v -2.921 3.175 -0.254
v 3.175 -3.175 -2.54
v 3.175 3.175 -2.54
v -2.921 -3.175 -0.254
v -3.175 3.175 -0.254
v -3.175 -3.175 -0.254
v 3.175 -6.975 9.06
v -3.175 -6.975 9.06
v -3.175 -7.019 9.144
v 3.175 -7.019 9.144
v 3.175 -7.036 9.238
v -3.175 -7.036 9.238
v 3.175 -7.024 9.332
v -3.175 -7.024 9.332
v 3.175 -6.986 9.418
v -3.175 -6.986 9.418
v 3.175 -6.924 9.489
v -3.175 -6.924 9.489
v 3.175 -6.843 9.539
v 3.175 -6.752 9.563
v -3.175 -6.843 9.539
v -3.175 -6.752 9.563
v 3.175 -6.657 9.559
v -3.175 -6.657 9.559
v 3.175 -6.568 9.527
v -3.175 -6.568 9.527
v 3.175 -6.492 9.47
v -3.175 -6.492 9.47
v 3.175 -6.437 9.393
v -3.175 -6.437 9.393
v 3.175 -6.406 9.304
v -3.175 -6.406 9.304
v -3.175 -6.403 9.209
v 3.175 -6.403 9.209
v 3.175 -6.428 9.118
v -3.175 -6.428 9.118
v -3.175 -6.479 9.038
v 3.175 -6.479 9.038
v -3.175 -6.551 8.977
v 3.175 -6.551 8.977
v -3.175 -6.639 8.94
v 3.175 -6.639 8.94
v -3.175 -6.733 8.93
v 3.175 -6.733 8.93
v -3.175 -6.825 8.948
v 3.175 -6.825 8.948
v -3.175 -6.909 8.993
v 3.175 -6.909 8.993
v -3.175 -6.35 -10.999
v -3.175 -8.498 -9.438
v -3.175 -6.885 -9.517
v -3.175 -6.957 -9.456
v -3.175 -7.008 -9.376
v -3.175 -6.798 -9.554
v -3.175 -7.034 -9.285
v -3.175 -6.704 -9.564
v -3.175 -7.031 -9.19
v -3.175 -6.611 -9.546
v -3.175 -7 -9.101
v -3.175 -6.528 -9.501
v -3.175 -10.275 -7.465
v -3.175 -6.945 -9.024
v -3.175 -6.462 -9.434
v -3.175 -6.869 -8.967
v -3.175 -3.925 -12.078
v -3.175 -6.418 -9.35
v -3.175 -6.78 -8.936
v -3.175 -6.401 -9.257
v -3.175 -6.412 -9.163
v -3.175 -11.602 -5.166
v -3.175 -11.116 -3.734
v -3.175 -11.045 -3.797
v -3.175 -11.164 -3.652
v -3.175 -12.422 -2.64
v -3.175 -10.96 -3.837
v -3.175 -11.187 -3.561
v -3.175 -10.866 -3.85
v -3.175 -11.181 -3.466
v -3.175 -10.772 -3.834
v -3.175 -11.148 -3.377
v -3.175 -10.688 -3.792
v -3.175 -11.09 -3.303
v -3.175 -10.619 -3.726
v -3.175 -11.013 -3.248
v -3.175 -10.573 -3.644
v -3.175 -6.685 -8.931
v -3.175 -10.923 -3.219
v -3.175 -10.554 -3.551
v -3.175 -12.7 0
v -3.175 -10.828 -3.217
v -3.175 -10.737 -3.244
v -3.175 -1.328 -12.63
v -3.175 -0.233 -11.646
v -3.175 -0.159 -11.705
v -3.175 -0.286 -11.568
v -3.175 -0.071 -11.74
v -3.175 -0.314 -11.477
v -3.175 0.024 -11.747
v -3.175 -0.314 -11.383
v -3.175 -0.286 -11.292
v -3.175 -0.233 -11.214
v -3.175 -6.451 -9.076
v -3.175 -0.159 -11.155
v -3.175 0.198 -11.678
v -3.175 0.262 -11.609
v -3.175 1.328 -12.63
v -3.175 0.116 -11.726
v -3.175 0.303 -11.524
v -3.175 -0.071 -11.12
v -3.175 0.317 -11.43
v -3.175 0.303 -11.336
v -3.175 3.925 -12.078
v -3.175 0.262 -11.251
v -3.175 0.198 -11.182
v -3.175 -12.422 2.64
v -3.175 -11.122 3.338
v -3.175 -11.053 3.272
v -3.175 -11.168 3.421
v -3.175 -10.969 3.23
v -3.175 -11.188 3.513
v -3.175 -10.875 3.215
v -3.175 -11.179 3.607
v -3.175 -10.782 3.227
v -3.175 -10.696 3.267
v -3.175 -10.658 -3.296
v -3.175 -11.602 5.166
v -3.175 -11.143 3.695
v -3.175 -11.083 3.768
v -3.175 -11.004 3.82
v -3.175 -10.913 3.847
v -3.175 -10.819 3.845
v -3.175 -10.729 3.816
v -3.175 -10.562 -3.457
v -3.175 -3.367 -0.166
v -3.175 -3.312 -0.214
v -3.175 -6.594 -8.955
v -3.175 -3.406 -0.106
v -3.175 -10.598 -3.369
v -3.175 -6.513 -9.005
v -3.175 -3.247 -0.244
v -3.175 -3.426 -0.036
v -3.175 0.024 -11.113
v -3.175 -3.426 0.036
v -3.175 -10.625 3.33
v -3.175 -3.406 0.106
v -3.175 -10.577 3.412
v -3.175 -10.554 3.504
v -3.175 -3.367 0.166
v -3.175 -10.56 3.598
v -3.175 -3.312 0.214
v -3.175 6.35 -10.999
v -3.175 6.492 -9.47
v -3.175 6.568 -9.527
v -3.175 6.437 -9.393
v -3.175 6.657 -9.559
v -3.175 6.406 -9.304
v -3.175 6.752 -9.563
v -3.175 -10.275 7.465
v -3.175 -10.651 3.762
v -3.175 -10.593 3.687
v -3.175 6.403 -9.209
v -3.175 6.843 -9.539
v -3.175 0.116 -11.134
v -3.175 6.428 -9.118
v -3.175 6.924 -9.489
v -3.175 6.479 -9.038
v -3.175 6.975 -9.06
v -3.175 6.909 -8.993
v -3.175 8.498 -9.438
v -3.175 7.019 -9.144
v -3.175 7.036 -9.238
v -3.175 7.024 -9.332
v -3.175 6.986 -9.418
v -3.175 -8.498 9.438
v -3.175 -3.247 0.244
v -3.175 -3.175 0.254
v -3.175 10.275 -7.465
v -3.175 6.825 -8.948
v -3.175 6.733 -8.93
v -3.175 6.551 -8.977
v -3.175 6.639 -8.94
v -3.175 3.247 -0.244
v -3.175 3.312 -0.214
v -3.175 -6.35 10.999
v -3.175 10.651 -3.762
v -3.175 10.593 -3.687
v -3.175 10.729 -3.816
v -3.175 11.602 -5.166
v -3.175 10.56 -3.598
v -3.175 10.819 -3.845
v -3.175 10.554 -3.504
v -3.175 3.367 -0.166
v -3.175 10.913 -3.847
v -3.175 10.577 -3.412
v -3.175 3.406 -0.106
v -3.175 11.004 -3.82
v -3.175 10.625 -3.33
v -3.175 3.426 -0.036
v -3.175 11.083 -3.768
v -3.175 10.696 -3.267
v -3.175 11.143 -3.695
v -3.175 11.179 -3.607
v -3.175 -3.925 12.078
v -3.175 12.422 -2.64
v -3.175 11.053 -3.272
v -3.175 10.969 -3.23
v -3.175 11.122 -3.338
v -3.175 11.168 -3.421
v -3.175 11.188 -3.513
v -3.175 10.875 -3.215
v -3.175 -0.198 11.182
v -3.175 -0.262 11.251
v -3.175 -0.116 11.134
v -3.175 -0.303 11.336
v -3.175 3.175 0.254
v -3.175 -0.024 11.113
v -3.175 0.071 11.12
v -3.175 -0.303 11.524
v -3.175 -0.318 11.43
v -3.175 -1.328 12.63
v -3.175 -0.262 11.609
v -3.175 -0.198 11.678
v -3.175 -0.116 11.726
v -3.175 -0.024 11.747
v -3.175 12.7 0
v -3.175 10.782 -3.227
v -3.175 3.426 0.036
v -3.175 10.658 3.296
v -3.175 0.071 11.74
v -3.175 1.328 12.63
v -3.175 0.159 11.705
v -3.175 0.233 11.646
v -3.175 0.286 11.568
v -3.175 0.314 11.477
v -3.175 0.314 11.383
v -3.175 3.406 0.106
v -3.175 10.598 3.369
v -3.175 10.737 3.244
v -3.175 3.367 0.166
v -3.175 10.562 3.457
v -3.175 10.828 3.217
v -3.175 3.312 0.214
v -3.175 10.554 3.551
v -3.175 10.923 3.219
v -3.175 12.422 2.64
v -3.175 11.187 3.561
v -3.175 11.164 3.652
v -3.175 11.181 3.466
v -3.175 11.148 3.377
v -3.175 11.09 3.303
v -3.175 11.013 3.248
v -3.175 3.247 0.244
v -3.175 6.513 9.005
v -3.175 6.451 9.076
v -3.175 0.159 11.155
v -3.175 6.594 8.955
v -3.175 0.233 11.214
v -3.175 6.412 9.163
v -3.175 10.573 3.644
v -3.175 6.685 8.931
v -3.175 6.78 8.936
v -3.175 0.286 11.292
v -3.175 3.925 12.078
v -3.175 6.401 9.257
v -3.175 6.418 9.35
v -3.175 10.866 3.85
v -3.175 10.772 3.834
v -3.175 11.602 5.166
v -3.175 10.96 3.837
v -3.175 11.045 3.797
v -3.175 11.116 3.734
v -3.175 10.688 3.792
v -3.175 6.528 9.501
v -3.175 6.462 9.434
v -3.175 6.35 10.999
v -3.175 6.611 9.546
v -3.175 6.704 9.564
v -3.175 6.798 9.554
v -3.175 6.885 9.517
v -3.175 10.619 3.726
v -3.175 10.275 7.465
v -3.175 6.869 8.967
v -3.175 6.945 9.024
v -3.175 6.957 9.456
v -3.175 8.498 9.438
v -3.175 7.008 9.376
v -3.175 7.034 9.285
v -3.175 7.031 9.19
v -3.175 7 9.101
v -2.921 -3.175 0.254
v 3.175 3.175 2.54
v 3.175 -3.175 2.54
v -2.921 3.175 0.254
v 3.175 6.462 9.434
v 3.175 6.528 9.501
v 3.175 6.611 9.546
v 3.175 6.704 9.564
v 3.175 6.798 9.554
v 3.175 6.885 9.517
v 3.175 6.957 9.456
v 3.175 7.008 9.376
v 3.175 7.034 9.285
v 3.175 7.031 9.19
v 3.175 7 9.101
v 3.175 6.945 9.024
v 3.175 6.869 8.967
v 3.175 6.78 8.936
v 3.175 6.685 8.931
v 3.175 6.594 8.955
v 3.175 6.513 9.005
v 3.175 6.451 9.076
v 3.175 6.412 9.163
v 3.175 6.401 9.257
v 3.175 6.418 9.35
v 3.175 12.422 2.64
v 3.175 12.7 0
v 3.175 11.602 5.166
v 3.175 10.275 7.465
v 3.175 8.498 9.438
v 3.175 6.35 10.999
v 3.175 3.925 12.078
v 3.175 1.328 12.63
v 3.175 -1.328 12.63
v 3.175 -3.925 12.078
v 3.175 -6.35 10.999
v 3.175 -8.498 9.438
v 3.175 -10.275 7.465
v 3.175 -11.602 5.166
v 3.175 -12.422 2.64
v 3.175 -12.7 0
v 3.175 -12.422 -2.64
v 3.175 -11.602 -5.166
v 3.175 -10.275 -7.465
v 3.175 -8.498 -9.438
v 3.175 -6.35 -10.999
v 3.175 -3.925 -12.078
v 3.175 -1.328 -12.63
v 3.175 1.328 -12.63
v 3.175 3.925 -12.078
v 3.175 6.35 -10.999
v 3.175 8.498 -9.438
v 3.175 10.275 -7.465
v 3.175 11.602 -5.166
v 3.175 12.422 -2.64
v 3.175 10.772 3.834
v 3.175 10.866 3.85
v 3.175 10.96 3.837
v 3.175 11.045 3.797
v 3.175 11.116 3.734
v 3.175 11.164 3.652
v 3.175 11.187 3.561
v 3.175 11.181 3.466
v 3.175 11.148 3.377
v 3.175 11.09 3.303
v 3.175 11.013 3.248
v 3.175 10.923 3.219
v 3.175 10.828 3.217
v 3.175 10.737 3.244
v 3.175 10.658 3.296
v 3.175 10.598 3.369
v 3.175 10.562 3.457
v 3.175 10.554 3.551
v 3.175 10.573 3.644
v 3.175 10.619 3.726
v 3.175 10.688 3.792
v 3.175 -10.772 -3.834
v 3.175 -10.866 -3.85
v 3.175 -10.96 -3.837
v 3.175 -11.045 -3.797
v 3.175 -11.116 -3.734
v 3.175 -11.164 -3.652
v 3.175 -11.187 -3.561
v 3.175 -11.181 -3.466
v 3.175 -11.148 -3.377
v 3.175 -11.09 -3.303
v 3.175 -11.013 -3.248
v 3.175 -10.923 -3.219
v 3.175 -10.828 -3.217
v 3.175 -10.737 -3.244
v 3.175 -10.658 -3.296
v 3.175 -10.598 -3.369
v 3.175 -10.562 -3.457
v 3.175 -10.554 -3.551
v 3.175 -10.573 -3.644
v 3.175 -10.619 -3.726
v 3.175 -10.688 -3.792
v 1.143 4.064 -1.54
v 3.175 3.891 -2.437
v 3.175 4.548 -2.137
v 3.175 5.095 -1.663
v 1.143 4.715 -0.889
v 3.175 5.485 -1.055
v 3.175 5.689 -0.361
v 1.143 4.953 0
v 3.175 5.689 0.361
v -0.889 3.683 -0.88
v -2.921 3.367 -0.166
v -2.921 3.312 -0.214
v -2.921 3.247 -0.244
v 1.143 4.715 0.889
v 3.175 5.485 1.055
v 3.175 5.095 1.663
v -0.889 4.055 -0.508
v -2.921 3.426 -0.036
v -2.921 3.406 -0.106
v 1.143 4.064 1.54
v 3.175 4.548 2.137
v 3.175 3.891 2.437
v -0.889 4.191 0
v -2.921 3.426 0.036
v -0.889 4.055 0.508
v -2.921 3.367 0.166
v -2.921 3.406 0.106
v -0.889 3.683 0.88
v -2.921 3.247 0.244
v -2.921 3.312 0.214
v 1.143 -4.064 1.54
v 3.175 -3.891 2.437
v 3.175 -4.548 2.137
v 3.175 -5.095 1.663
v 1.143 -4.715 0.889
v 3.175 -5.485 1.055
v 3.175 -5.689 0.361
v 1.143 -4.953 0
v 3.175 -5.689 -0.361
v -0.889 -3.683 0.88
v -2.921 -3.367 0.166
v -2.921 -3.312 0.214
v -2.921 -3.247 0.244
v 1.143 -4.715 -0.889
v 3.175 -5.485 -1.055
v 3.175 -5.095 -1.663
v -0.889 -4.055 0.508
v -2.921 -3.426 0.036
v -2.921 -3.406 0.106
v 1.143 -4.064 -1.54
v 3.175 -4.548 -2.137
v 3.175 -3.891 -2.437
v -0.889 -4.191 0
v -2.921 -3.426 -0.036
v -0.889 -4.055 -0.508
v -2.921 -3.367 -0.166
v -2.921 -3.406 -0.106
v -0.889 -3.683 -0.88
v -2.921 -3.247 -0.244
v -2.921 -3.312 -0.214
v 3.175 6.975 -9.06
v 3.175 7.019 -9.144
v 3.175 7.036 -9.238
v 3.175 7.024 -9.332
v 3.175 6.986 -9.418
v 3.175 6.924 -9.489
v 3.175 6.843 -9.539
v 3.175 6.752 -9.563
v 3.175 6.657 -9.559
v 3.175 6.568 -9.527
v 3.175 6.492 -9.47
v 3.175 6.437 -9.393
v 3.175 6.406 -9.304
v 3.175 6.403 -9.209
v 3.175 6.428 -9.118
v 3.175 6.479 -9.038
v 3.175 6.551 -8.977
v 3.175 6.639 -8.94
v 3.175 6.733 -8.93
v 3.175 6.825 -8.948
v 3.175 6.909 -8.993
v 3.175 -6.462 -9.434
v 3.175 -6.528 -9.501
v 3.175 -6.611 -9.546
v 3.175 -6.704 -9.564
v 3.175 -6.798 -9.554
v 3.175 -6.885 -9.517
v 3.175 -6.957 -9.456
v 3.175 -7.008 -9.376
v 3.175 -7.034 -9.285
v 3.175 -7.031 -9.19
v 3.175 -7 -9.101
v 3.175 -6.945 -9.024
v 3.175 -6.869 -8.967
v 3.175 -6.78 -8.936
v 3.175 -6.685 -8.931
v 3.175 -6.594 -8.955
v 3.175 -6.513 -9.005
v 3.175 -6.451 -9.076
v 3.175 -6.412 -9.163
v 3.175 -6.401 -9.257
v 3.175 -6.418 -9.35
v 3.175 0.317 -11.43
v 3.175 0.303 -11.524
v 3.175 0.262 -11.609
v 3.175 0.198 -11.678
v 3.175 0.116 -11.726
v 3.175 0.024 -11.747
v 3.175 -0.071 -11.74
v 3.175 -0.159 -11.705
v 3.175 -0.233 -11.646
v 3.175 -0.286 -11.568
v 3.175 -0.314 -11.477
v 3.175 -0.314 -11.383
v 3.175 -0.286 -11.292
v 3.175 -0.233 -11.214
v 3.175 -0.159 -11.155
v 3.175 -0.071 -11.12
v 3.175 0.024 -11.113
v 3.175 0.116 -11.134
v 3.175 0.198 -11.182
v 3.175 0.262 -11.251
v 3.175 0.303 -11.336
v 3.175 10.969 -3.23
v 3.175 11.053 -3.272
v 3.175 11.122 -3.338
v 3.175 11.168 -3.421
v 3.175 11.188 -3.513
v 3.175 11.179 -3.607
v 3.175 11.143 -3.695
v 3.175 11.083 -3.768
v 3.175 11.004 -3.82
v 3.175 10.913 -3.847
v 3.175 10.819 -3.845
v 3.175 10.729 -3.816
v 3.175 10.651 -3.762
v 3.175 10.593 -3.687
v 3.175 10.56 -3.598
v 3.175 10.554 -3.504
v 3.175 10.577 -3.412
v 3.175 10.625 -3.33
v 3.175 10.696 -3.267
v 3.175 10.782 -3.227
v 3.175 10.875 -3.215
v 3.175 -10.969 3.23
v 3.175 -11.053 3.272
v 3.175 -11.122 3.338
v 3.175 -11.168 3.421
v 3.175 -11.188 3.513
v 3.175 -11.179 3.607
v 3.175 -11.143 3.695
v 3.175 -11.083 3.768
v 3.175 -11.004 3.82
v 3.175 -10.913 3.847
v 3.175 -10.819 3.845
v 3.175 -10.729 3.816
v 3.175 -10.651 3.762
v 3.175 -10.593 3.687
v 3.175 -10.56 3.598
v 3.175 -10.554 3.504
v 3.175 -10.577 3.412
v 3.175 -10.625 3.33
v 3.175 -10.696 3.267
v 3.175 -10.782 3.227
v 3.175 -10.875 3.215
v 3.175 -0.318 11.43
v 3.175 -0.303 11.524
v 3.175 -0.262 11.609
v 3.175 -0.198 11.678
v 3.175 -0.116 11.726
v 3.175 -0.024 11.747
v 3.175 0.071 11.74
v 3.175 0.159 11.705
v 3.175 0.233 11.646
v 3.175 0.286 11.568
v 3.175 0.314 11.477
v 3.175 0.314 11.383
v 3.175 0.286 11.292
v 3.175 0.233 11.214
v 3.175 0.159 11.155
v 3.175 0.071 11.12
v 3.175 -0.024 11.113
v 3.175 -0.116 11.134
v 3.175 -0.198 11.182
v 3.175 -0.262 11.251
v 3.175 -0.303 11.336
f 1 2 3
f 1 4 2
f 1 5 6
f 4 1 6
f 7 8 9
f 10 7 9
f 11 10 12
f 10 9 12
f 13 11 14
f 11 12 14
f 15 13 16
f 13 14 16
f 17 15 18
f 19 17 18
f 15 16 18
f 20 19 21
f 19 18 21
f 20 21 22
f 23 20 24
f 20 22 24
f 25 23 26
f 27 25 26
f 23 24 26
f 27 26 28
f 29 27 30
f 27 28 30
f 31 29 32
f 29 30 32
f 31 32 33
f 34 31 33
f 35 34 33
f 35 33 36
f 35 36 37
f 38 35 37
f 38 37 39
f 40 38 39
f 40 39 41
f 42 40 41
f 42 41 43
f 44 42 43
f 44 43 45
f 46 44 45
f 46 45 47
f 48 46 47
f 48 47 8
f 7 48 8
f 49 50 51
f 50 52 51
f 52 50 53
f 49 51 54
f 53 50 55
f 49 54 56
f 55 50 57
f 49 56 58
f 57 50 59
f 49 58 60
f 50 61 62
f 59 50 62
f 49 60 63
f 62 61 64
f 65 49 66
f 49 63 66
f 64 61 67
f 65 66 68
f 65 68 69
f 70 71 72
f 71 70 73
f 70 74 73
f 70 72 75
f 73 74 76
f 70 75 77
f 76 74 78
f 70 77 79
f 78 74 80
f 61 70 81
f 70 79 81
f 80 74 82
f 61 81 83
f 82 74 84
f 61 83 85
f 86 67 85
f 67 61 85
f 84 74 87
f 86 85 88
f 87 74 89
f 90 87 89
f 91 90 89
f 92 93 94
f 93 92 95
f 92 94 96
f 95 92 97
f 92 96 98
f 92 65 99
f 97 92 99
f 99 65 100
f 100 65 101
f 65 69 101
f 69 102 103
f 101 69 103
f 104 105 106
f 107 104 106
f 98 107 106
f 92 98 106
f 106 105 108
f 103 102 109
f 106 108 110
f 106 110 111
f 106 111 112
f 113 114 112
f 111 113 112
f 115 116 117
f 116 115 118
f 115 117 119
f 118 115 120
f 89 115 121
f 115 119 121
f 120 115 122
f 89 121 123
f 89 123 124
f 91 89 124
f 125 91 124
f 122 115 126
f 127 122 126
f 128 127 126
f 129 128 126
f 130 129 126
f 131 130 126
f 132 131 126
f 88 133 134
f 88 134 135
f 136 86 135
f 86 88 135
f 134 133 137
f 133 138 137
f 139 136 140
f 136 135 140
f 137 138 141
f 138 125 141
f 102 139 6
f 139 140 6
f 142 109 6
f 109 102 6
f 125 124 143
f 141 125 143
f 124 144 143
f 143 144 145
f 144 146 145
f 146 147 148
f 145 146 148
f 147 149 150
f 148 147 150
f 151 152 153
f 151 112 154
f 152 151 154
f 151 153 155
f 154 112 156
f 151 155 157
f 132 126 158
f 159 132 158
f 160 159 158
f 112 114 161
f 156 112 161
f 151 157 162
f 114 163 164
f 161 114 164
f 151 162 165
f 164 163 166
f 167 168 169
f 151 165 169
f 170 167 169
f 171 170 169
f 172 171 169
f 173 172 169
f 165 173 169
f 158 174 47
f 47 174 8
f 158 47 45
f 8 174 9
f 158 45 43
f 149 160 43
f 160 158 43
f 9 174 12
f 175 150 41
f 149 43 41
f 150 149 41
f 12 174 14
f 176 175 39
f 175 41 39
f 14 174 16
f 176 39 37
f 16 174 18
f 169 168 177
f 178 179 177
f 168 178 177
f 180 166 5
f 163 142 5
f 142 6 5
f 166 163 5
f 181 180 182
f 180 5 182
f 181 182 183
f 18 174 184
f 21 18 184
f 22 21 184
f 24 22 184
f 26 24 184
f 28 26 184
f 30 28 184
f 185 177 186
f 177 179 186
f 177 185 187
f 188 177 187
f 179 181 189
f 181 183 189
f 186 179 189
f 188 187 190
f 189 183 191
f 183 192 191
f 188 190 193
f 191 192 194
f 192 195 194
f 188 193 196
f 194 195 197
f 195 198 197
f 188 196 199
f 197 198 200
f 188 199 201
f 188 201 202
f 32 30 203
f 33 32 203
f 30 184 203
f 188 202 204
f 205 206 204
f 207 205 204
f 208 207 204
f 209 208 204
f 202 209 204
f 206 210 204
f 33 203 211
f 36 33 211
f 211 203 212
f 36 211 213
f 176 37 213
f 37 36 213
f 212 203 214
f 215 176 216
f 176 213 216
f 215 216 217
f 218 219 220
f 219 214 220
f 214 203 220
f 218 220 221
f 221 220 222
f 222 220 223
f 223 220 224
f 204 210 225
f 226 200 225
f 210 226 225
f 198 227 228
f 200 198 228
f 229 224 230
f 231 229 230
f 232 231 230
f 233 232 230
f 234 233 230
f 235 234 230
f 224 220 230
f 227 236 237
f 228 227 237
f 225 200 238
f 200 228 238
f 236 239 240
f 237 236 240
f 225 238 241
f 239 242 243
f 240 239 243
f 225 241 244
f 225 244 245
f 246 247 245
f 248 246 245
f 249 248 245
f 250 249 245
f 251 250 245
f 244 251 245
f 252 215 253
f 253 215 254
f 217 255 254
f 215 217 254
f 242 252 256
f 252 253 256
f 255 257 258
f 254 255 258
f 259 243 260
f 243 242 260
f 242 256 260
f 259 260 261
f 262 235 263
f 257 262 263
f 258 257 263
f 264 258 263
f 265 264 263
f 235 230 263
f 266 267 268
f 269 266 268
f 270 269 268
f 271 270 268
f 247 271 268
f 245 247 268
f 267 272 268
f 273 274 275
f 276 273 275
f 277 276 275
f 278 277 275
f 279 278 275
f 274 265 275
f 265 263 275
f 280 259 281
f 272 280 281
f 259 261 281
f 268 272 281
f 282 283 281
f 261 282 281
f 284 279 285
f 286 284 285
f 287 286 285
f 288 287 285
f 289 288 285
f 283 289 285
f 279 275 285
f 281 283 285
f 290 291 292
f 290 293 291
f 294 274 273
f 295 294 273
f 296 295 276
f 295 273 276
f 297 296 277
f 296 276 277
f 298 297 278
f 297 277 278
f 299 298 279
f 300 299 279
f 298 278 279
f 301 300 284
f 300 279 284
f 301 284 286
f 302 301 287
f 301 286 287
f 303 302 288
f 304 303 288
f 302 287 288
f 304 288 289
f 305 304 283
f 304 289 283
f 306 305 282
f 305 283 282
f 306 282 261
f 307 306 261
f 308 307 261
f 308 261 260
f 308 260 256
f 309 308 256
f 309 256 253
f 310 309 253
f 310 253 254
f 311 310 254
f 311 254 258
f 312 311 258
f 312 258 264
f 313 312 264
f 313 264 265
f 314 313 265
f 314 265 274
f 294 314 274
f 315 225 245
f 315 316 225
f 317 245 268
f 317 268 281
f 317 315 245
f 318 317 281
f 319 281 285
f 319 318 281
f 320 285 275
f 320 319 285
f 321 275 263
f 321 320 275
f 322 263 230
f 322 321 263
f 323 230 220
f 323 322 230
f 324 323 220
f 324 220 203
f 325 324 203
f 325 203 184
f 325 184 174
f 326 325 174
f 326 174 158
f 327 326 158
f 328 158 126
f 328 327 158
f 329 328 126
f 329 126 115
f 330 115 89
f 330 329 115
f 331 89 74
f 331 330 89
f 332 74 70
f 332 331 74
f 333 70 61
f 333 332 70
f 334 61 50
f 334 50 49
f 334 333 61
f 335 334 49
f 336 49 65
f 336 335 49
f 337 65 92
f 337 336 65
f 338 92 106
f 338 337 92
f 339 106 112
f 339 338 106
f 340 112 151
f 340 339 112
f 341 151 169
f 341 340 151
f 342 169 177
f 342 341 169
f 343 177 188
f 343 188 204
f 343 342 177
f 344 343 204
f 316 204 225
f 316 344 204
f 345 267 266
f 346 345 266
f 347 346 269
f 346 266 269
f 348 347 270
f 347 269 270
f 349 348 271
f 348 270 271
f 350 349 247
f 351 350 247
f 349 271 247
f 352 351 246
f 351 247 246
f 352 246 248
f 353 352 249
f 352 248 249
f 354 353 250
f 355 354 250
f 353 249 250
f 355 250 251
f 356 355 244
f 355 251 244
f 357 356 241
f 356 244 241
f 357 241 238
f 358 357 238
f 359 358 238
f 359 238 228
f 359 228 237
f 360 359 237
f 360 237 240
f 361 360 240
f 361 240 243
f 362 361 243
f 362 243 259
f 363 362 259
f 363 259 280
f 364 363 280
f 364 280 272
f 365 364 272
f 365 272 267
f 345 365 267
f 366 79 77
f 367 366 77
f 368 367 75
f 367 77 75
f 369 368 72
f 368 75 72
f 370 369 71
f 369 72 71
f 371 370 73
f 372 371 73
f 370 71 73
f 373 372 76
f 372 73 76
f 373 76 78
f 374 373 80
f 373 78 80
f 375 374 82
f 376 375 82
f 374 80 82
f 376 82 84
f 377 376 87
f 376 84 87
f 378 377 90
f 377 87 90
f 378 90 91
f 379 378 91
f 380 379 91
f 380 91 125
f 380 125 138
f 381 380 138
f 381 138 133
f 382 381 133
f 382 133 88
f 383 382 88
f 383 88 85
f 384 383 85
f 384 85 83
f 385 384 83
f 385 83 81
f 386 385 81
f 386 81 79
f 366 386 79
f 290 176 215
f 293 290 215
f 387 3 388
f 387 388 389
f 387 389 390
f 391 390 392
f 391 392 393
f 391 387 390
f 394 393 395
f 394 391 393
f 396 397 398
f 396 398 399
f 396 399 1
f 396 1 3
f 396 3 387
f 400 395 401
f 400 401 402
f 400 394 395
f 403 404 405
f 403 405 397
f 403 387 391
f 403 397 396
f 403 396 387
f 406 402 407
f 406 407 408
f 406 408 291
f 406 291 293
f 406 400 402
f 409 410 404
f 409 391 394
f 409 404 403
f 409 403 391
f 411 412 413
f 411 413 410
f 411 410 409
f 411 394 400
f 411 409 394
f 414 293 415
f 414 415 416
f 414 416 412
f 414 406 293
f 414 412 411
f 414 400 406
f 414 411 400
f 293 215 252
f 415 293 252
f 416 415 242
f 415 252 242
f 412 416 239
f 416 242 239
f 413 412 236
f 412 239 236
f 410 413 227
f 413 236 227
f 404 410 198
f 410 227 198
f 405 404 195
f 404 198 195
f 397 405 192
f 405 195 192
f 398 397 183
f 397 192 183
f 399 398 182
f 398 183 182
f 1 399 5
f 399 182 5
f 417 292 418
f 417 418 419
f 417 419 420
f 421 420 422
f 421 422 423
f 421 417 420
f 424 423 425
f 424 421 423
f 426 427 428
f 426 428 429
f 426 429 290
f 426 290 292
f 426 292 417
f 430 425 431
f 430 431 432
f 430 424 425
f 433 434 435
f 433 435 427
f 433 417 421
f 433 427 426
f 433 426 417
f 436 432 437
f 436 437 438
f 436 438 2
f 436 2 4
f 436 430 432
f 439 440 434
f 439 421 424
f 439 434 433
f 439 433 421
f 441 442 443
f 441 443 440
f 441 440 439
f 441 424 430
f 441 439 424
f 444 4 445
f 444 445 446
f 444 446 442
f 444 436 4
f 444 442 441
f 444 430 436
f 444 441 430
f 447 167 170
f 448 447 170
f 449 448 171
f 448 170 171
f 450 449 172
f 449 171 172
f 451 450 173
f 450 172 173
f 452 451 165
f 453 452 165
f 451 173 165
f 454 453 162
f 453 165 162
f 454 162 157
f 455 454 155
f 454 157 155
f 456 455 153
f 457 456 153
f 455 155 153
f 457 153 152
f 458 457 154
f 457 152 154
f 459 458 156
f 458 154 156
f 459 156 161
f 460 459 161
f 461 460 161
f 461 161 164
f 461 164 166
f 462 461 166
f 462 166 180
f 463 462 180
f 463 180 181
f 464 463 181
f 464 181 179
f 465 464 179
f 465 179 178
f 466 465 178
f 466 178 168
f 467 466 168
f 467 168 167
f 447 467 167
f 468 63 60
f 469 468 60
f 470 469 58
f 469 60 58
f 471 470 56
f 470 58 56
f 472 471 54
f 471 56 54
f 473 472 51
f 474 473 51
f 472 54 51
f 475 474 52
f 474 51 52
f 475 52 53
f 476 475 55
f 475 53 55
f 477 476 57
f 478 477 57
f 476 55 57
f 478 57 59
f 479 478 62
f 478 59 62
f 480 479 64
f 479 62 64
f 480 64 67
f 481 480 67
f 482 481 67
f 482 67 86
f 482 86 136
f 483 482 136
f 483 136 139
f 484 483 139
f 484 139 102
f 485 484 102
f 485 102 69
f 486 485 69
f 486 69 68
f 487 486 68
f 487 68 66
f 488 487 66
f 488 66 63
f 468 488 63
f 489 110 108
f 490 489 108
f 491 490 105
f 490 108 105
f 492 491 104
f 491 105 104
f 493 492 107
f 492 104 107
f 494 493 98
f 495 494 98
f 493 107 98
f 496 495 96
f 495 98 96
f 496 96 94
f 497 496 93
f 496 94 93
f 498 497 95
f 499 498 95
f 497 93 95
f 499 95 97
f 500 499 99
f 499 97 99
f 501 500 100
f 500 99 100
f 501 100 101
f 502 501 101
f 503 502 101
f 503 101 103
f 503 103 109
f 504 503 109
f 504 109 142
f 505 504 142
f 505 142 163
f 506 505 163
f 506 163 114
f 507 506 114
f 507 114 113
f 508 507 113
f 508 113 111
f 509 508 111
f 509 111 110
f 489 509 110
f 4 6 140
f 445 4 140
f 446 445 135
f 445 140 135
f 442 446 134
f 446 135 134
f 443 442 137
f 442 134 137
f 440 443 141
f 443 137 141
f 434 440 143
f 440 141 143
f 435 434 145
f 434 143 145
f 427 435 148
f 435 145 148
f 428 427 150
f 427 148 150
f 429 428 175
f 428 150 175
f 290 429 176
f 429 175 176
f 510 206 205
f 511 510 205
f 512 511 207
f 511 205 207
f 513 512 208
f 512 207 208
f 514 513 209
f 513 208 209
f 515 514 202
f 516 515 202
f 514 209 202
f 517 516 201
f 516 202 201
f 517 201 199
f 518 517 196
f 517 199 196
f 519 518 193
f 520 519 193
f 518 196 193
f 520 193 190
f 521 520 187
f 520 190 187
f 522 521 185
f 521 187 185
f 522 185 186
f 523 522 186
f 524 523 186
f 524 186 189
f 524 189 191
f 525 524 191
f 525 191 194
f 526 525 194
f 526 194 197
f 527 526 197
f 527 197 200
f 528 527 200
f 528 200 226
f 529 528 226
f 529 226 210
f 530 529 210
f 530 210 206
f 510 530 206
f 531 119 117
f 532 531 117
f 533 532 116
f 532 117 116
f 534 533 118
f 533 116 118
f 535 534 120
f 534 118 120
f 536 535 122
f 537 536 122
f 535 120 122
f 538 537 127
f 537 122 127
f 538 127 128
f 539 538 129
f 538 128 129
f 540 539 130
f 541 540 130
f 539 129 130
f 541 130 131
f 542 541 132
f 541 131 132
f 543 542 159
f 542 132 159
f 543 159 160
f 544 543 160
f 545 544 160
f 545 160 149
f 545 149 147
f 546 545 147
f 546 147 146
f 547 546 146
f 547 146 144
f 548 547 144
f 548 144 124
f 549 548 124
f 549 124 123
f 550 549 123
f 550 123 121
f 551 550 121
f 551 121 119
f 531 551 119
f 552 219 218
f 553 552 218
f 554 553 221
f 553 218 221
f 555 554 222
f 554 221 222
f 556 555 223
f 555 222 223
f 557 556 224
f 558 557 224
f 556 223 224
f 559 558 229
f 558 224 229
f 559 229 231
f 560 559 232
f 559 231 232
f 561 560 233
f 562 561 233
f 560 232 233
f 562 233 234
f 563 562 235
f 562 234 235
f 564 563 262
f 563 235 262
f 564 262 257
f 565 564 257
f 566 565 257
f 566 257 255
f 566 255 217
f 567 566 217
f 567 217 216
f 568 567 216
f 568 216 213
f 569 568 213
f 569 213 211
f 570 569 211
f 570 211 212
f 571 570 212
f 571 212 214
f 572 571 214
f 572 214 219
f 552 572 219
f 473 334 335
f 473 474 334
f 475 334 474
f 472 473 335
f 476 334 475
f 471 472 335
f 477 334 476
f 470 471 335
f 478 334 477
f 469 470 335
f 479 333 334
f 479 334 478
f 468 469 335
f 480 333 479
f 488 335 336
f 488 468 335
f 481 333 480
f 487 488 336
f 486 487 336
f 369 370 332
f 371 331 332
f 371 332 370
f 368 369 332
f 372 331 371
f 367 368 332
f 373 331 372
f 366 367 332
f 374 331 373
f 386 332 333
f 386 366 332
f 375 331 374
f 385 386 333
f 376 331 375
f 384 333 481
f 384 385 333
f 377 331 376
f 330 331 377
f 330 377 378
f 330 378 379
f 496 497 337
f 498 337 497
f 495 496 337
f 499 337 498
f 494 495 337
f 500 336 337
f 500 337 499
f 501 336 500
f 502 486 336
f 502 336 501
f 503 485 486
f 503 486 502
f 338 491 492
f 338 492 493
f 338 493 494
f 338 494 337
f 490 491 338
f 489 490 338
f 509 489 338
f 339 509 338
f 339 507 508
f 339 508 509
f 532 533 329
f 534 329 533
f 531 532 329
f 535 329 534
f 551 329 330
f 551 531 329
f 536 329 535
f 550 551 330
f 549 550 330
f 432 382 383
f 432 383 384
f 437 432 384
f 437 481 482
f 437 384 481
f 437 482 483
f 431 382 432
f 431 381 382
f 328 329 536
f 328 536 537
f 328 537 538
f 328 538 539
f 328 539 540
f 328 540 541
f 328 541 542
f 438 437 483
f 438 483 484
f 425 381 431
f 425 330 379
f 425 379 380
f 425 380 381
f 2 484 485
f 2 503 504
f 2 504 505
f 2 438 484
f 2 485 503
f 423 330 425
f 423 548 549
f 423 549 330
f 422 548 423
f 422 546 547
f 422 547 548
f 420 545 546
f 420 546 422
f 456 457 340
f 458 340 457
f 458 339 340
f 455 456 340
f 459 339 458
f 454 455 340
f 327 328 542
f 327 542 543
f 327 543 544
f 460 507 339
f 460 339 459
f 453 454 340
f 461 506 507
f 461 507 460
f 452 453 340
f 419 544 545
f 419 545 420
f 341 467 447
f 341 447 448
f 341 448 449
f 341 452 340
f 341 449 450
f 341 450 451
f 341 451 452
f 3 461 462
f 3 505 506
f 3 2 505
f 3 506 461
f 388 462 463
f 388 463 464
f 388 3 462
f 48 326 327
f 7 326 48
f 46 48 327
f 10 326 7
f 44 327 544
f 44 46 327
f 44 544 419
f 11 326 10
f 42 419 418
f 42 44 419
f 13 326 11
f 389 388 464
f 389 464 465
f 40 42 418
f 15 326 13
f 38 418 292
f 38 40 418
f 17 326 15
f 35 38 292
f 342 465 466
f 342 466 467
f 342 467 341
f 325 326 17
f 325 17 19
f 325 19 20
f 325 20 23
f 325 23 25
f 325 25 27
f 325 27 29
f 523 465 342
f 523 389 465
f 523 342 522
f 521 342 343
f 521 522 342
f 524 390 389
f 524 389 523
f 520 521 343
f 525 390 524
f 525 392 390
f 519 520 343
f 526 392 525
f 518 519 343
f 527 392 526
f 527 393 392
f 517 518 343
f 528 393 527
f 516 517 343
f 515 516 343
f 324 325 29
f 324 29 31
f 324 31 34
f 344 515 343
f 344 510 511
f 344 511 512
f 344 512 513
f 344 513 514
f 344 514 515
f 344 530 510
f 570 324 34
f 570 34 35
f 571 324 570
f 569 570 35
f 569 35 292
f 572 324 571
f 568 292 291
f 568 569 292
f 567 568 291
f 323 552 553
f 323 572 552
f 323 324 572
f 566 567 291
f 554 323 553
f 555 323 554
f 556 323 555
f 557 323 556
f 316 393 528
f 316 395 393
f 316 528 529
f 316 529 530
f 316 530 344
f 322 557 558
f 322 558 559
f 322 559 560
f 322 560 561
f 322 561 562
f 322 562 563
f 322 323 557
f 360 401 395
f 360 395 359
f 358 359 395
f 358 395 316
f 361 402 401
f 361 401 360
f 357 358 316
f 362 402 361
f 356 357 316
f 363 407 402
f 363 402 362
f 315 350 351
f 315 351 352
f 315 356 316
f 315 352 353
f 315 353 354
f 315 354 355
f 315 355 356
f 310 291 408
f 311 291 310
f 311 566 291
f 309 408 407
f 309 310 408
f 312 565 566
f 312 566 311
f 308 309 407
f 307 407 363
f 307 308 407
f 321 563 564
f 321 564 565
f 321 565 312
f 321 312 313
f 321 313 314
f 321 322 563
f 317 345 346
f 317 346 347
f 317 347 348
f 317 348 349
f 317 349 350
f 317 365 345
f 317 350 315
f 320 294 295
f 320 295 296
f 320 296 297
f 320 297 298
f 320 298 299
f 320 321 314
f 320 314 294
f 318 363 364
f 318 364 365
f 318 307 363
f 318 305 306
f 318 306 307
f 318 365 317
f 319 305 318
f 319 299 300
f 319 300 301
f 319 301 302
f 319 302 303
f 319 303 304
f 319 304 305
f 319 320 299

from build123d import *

# Parameters (mm, degrees)
F0_R            = 12.7
F1_DEPTH        = 3.175
F2_R            = 0.3175
F4_DEPTH        = 6.351
F4_COPIES_COUNT = 10
F7_DEPTH        = 0.254


# Not quite as in the source:
# - a pattern or mirror of a feature is missing from the dataset's text; its kind, count and spacing are read off the source's solid


with BuildPart() as f1:
    # F0 (on Right) → F1 (new body, symmetric)
    with BuildSketch(Plane.YZ):
        Circle(F0_R)
    extrude(amount=F1_DEPTH, both=True)

    # F2 (on face) → F4 (cut, through all)
    with BuildSketch(Plane(origin=(-3.175, 0, 0), x_dir=(0, -1, 0), z_dir=(-1, 0, 0))):
        with Locations((0, 11.43)):
            Circle(F2_R)
    f4 = extrude(amount=-F4_DEPTH, mode=Mode.SUBTRACT)

    # F4_copies: F4 ×10 about axis
    f4_copies_axis = Axis((0, 0, 0), (1, 0, 0))
    for i in range(1, F4_COPIES_COUNT):
        add(f4.rotate(f4_copies_axis, i * 360 / F4_COPIES_COUNT), mode=Mode.SUBTRACT)

    # F5 (on face) → F7 (cut)
    with BuildSketch(Plane(origin=(-3.175, 0, 0), x_dir=(0, -1, 0), z_dir=(-1, 0, 0))):
        with BuildLine():
            ThreePointArc((-3.175, 0.254), (-3.429, 0), (-3.175, -0.254))
            Line((-3.175, -0.254), (0, -0.254))
            Line((0, -0.254), (3.175, -0.254))
            ThreePointArc((3.175, -0.254), (3.429, 0), (3.175, 0.254))
            Line((3.175, 0.254), (0, 0.254))
            Line((0, 0.254), (-3.175, 0.254))
        make_face()
    extrude(amount=-F7_DEPTH, mode=Mode.SUBTRACT)

    # F6 (on face) → F9 section 0
    with BuildSketch(Plane.YZ.offset(3.175)):
        with BuildLine():
            ThreePointArc((-3.175, 2.54), (-5.715, 0), (-3.175, -2.54))
            Line((-3.175, -2.54), (0, -2.54))
            Line((0, -2.54), (3.175, -2.54))
            ThreePointArc((3.175, -2.54), (5.715, 0), (3.175, 2.54))
            Line((3.175, 2.54), (0, 2.54))
            Line((0, 2.54), (-3.175, 2.54))
        make_face()
    # F8 (on face) → F9 section 1
    with BuildSketch(Plane(origin=(-2.921, 0, 0), x_dir=(0, -1, 0), z_dir=(-1, 0, 0))):
        with BuildLine():
            ThreePointArc((-3.175, 0.254), (-3.429, 0), (-3.175, -0.254))
            Line((-3.175, -0.254), (0, -0.254))
            Line((0, -0.254), (3.175, -0.254))
            ThreePointArc((3.175, -0.254), (3.429, 0), (3.175, 0.254))
            Line((3.175, 0.254), (0, 0.254))
            Line((0, 0.254), (-3.175, 0.254))
        make_face()
    loft(mode=Mode.SUBTRACT)


solid = f1.part
